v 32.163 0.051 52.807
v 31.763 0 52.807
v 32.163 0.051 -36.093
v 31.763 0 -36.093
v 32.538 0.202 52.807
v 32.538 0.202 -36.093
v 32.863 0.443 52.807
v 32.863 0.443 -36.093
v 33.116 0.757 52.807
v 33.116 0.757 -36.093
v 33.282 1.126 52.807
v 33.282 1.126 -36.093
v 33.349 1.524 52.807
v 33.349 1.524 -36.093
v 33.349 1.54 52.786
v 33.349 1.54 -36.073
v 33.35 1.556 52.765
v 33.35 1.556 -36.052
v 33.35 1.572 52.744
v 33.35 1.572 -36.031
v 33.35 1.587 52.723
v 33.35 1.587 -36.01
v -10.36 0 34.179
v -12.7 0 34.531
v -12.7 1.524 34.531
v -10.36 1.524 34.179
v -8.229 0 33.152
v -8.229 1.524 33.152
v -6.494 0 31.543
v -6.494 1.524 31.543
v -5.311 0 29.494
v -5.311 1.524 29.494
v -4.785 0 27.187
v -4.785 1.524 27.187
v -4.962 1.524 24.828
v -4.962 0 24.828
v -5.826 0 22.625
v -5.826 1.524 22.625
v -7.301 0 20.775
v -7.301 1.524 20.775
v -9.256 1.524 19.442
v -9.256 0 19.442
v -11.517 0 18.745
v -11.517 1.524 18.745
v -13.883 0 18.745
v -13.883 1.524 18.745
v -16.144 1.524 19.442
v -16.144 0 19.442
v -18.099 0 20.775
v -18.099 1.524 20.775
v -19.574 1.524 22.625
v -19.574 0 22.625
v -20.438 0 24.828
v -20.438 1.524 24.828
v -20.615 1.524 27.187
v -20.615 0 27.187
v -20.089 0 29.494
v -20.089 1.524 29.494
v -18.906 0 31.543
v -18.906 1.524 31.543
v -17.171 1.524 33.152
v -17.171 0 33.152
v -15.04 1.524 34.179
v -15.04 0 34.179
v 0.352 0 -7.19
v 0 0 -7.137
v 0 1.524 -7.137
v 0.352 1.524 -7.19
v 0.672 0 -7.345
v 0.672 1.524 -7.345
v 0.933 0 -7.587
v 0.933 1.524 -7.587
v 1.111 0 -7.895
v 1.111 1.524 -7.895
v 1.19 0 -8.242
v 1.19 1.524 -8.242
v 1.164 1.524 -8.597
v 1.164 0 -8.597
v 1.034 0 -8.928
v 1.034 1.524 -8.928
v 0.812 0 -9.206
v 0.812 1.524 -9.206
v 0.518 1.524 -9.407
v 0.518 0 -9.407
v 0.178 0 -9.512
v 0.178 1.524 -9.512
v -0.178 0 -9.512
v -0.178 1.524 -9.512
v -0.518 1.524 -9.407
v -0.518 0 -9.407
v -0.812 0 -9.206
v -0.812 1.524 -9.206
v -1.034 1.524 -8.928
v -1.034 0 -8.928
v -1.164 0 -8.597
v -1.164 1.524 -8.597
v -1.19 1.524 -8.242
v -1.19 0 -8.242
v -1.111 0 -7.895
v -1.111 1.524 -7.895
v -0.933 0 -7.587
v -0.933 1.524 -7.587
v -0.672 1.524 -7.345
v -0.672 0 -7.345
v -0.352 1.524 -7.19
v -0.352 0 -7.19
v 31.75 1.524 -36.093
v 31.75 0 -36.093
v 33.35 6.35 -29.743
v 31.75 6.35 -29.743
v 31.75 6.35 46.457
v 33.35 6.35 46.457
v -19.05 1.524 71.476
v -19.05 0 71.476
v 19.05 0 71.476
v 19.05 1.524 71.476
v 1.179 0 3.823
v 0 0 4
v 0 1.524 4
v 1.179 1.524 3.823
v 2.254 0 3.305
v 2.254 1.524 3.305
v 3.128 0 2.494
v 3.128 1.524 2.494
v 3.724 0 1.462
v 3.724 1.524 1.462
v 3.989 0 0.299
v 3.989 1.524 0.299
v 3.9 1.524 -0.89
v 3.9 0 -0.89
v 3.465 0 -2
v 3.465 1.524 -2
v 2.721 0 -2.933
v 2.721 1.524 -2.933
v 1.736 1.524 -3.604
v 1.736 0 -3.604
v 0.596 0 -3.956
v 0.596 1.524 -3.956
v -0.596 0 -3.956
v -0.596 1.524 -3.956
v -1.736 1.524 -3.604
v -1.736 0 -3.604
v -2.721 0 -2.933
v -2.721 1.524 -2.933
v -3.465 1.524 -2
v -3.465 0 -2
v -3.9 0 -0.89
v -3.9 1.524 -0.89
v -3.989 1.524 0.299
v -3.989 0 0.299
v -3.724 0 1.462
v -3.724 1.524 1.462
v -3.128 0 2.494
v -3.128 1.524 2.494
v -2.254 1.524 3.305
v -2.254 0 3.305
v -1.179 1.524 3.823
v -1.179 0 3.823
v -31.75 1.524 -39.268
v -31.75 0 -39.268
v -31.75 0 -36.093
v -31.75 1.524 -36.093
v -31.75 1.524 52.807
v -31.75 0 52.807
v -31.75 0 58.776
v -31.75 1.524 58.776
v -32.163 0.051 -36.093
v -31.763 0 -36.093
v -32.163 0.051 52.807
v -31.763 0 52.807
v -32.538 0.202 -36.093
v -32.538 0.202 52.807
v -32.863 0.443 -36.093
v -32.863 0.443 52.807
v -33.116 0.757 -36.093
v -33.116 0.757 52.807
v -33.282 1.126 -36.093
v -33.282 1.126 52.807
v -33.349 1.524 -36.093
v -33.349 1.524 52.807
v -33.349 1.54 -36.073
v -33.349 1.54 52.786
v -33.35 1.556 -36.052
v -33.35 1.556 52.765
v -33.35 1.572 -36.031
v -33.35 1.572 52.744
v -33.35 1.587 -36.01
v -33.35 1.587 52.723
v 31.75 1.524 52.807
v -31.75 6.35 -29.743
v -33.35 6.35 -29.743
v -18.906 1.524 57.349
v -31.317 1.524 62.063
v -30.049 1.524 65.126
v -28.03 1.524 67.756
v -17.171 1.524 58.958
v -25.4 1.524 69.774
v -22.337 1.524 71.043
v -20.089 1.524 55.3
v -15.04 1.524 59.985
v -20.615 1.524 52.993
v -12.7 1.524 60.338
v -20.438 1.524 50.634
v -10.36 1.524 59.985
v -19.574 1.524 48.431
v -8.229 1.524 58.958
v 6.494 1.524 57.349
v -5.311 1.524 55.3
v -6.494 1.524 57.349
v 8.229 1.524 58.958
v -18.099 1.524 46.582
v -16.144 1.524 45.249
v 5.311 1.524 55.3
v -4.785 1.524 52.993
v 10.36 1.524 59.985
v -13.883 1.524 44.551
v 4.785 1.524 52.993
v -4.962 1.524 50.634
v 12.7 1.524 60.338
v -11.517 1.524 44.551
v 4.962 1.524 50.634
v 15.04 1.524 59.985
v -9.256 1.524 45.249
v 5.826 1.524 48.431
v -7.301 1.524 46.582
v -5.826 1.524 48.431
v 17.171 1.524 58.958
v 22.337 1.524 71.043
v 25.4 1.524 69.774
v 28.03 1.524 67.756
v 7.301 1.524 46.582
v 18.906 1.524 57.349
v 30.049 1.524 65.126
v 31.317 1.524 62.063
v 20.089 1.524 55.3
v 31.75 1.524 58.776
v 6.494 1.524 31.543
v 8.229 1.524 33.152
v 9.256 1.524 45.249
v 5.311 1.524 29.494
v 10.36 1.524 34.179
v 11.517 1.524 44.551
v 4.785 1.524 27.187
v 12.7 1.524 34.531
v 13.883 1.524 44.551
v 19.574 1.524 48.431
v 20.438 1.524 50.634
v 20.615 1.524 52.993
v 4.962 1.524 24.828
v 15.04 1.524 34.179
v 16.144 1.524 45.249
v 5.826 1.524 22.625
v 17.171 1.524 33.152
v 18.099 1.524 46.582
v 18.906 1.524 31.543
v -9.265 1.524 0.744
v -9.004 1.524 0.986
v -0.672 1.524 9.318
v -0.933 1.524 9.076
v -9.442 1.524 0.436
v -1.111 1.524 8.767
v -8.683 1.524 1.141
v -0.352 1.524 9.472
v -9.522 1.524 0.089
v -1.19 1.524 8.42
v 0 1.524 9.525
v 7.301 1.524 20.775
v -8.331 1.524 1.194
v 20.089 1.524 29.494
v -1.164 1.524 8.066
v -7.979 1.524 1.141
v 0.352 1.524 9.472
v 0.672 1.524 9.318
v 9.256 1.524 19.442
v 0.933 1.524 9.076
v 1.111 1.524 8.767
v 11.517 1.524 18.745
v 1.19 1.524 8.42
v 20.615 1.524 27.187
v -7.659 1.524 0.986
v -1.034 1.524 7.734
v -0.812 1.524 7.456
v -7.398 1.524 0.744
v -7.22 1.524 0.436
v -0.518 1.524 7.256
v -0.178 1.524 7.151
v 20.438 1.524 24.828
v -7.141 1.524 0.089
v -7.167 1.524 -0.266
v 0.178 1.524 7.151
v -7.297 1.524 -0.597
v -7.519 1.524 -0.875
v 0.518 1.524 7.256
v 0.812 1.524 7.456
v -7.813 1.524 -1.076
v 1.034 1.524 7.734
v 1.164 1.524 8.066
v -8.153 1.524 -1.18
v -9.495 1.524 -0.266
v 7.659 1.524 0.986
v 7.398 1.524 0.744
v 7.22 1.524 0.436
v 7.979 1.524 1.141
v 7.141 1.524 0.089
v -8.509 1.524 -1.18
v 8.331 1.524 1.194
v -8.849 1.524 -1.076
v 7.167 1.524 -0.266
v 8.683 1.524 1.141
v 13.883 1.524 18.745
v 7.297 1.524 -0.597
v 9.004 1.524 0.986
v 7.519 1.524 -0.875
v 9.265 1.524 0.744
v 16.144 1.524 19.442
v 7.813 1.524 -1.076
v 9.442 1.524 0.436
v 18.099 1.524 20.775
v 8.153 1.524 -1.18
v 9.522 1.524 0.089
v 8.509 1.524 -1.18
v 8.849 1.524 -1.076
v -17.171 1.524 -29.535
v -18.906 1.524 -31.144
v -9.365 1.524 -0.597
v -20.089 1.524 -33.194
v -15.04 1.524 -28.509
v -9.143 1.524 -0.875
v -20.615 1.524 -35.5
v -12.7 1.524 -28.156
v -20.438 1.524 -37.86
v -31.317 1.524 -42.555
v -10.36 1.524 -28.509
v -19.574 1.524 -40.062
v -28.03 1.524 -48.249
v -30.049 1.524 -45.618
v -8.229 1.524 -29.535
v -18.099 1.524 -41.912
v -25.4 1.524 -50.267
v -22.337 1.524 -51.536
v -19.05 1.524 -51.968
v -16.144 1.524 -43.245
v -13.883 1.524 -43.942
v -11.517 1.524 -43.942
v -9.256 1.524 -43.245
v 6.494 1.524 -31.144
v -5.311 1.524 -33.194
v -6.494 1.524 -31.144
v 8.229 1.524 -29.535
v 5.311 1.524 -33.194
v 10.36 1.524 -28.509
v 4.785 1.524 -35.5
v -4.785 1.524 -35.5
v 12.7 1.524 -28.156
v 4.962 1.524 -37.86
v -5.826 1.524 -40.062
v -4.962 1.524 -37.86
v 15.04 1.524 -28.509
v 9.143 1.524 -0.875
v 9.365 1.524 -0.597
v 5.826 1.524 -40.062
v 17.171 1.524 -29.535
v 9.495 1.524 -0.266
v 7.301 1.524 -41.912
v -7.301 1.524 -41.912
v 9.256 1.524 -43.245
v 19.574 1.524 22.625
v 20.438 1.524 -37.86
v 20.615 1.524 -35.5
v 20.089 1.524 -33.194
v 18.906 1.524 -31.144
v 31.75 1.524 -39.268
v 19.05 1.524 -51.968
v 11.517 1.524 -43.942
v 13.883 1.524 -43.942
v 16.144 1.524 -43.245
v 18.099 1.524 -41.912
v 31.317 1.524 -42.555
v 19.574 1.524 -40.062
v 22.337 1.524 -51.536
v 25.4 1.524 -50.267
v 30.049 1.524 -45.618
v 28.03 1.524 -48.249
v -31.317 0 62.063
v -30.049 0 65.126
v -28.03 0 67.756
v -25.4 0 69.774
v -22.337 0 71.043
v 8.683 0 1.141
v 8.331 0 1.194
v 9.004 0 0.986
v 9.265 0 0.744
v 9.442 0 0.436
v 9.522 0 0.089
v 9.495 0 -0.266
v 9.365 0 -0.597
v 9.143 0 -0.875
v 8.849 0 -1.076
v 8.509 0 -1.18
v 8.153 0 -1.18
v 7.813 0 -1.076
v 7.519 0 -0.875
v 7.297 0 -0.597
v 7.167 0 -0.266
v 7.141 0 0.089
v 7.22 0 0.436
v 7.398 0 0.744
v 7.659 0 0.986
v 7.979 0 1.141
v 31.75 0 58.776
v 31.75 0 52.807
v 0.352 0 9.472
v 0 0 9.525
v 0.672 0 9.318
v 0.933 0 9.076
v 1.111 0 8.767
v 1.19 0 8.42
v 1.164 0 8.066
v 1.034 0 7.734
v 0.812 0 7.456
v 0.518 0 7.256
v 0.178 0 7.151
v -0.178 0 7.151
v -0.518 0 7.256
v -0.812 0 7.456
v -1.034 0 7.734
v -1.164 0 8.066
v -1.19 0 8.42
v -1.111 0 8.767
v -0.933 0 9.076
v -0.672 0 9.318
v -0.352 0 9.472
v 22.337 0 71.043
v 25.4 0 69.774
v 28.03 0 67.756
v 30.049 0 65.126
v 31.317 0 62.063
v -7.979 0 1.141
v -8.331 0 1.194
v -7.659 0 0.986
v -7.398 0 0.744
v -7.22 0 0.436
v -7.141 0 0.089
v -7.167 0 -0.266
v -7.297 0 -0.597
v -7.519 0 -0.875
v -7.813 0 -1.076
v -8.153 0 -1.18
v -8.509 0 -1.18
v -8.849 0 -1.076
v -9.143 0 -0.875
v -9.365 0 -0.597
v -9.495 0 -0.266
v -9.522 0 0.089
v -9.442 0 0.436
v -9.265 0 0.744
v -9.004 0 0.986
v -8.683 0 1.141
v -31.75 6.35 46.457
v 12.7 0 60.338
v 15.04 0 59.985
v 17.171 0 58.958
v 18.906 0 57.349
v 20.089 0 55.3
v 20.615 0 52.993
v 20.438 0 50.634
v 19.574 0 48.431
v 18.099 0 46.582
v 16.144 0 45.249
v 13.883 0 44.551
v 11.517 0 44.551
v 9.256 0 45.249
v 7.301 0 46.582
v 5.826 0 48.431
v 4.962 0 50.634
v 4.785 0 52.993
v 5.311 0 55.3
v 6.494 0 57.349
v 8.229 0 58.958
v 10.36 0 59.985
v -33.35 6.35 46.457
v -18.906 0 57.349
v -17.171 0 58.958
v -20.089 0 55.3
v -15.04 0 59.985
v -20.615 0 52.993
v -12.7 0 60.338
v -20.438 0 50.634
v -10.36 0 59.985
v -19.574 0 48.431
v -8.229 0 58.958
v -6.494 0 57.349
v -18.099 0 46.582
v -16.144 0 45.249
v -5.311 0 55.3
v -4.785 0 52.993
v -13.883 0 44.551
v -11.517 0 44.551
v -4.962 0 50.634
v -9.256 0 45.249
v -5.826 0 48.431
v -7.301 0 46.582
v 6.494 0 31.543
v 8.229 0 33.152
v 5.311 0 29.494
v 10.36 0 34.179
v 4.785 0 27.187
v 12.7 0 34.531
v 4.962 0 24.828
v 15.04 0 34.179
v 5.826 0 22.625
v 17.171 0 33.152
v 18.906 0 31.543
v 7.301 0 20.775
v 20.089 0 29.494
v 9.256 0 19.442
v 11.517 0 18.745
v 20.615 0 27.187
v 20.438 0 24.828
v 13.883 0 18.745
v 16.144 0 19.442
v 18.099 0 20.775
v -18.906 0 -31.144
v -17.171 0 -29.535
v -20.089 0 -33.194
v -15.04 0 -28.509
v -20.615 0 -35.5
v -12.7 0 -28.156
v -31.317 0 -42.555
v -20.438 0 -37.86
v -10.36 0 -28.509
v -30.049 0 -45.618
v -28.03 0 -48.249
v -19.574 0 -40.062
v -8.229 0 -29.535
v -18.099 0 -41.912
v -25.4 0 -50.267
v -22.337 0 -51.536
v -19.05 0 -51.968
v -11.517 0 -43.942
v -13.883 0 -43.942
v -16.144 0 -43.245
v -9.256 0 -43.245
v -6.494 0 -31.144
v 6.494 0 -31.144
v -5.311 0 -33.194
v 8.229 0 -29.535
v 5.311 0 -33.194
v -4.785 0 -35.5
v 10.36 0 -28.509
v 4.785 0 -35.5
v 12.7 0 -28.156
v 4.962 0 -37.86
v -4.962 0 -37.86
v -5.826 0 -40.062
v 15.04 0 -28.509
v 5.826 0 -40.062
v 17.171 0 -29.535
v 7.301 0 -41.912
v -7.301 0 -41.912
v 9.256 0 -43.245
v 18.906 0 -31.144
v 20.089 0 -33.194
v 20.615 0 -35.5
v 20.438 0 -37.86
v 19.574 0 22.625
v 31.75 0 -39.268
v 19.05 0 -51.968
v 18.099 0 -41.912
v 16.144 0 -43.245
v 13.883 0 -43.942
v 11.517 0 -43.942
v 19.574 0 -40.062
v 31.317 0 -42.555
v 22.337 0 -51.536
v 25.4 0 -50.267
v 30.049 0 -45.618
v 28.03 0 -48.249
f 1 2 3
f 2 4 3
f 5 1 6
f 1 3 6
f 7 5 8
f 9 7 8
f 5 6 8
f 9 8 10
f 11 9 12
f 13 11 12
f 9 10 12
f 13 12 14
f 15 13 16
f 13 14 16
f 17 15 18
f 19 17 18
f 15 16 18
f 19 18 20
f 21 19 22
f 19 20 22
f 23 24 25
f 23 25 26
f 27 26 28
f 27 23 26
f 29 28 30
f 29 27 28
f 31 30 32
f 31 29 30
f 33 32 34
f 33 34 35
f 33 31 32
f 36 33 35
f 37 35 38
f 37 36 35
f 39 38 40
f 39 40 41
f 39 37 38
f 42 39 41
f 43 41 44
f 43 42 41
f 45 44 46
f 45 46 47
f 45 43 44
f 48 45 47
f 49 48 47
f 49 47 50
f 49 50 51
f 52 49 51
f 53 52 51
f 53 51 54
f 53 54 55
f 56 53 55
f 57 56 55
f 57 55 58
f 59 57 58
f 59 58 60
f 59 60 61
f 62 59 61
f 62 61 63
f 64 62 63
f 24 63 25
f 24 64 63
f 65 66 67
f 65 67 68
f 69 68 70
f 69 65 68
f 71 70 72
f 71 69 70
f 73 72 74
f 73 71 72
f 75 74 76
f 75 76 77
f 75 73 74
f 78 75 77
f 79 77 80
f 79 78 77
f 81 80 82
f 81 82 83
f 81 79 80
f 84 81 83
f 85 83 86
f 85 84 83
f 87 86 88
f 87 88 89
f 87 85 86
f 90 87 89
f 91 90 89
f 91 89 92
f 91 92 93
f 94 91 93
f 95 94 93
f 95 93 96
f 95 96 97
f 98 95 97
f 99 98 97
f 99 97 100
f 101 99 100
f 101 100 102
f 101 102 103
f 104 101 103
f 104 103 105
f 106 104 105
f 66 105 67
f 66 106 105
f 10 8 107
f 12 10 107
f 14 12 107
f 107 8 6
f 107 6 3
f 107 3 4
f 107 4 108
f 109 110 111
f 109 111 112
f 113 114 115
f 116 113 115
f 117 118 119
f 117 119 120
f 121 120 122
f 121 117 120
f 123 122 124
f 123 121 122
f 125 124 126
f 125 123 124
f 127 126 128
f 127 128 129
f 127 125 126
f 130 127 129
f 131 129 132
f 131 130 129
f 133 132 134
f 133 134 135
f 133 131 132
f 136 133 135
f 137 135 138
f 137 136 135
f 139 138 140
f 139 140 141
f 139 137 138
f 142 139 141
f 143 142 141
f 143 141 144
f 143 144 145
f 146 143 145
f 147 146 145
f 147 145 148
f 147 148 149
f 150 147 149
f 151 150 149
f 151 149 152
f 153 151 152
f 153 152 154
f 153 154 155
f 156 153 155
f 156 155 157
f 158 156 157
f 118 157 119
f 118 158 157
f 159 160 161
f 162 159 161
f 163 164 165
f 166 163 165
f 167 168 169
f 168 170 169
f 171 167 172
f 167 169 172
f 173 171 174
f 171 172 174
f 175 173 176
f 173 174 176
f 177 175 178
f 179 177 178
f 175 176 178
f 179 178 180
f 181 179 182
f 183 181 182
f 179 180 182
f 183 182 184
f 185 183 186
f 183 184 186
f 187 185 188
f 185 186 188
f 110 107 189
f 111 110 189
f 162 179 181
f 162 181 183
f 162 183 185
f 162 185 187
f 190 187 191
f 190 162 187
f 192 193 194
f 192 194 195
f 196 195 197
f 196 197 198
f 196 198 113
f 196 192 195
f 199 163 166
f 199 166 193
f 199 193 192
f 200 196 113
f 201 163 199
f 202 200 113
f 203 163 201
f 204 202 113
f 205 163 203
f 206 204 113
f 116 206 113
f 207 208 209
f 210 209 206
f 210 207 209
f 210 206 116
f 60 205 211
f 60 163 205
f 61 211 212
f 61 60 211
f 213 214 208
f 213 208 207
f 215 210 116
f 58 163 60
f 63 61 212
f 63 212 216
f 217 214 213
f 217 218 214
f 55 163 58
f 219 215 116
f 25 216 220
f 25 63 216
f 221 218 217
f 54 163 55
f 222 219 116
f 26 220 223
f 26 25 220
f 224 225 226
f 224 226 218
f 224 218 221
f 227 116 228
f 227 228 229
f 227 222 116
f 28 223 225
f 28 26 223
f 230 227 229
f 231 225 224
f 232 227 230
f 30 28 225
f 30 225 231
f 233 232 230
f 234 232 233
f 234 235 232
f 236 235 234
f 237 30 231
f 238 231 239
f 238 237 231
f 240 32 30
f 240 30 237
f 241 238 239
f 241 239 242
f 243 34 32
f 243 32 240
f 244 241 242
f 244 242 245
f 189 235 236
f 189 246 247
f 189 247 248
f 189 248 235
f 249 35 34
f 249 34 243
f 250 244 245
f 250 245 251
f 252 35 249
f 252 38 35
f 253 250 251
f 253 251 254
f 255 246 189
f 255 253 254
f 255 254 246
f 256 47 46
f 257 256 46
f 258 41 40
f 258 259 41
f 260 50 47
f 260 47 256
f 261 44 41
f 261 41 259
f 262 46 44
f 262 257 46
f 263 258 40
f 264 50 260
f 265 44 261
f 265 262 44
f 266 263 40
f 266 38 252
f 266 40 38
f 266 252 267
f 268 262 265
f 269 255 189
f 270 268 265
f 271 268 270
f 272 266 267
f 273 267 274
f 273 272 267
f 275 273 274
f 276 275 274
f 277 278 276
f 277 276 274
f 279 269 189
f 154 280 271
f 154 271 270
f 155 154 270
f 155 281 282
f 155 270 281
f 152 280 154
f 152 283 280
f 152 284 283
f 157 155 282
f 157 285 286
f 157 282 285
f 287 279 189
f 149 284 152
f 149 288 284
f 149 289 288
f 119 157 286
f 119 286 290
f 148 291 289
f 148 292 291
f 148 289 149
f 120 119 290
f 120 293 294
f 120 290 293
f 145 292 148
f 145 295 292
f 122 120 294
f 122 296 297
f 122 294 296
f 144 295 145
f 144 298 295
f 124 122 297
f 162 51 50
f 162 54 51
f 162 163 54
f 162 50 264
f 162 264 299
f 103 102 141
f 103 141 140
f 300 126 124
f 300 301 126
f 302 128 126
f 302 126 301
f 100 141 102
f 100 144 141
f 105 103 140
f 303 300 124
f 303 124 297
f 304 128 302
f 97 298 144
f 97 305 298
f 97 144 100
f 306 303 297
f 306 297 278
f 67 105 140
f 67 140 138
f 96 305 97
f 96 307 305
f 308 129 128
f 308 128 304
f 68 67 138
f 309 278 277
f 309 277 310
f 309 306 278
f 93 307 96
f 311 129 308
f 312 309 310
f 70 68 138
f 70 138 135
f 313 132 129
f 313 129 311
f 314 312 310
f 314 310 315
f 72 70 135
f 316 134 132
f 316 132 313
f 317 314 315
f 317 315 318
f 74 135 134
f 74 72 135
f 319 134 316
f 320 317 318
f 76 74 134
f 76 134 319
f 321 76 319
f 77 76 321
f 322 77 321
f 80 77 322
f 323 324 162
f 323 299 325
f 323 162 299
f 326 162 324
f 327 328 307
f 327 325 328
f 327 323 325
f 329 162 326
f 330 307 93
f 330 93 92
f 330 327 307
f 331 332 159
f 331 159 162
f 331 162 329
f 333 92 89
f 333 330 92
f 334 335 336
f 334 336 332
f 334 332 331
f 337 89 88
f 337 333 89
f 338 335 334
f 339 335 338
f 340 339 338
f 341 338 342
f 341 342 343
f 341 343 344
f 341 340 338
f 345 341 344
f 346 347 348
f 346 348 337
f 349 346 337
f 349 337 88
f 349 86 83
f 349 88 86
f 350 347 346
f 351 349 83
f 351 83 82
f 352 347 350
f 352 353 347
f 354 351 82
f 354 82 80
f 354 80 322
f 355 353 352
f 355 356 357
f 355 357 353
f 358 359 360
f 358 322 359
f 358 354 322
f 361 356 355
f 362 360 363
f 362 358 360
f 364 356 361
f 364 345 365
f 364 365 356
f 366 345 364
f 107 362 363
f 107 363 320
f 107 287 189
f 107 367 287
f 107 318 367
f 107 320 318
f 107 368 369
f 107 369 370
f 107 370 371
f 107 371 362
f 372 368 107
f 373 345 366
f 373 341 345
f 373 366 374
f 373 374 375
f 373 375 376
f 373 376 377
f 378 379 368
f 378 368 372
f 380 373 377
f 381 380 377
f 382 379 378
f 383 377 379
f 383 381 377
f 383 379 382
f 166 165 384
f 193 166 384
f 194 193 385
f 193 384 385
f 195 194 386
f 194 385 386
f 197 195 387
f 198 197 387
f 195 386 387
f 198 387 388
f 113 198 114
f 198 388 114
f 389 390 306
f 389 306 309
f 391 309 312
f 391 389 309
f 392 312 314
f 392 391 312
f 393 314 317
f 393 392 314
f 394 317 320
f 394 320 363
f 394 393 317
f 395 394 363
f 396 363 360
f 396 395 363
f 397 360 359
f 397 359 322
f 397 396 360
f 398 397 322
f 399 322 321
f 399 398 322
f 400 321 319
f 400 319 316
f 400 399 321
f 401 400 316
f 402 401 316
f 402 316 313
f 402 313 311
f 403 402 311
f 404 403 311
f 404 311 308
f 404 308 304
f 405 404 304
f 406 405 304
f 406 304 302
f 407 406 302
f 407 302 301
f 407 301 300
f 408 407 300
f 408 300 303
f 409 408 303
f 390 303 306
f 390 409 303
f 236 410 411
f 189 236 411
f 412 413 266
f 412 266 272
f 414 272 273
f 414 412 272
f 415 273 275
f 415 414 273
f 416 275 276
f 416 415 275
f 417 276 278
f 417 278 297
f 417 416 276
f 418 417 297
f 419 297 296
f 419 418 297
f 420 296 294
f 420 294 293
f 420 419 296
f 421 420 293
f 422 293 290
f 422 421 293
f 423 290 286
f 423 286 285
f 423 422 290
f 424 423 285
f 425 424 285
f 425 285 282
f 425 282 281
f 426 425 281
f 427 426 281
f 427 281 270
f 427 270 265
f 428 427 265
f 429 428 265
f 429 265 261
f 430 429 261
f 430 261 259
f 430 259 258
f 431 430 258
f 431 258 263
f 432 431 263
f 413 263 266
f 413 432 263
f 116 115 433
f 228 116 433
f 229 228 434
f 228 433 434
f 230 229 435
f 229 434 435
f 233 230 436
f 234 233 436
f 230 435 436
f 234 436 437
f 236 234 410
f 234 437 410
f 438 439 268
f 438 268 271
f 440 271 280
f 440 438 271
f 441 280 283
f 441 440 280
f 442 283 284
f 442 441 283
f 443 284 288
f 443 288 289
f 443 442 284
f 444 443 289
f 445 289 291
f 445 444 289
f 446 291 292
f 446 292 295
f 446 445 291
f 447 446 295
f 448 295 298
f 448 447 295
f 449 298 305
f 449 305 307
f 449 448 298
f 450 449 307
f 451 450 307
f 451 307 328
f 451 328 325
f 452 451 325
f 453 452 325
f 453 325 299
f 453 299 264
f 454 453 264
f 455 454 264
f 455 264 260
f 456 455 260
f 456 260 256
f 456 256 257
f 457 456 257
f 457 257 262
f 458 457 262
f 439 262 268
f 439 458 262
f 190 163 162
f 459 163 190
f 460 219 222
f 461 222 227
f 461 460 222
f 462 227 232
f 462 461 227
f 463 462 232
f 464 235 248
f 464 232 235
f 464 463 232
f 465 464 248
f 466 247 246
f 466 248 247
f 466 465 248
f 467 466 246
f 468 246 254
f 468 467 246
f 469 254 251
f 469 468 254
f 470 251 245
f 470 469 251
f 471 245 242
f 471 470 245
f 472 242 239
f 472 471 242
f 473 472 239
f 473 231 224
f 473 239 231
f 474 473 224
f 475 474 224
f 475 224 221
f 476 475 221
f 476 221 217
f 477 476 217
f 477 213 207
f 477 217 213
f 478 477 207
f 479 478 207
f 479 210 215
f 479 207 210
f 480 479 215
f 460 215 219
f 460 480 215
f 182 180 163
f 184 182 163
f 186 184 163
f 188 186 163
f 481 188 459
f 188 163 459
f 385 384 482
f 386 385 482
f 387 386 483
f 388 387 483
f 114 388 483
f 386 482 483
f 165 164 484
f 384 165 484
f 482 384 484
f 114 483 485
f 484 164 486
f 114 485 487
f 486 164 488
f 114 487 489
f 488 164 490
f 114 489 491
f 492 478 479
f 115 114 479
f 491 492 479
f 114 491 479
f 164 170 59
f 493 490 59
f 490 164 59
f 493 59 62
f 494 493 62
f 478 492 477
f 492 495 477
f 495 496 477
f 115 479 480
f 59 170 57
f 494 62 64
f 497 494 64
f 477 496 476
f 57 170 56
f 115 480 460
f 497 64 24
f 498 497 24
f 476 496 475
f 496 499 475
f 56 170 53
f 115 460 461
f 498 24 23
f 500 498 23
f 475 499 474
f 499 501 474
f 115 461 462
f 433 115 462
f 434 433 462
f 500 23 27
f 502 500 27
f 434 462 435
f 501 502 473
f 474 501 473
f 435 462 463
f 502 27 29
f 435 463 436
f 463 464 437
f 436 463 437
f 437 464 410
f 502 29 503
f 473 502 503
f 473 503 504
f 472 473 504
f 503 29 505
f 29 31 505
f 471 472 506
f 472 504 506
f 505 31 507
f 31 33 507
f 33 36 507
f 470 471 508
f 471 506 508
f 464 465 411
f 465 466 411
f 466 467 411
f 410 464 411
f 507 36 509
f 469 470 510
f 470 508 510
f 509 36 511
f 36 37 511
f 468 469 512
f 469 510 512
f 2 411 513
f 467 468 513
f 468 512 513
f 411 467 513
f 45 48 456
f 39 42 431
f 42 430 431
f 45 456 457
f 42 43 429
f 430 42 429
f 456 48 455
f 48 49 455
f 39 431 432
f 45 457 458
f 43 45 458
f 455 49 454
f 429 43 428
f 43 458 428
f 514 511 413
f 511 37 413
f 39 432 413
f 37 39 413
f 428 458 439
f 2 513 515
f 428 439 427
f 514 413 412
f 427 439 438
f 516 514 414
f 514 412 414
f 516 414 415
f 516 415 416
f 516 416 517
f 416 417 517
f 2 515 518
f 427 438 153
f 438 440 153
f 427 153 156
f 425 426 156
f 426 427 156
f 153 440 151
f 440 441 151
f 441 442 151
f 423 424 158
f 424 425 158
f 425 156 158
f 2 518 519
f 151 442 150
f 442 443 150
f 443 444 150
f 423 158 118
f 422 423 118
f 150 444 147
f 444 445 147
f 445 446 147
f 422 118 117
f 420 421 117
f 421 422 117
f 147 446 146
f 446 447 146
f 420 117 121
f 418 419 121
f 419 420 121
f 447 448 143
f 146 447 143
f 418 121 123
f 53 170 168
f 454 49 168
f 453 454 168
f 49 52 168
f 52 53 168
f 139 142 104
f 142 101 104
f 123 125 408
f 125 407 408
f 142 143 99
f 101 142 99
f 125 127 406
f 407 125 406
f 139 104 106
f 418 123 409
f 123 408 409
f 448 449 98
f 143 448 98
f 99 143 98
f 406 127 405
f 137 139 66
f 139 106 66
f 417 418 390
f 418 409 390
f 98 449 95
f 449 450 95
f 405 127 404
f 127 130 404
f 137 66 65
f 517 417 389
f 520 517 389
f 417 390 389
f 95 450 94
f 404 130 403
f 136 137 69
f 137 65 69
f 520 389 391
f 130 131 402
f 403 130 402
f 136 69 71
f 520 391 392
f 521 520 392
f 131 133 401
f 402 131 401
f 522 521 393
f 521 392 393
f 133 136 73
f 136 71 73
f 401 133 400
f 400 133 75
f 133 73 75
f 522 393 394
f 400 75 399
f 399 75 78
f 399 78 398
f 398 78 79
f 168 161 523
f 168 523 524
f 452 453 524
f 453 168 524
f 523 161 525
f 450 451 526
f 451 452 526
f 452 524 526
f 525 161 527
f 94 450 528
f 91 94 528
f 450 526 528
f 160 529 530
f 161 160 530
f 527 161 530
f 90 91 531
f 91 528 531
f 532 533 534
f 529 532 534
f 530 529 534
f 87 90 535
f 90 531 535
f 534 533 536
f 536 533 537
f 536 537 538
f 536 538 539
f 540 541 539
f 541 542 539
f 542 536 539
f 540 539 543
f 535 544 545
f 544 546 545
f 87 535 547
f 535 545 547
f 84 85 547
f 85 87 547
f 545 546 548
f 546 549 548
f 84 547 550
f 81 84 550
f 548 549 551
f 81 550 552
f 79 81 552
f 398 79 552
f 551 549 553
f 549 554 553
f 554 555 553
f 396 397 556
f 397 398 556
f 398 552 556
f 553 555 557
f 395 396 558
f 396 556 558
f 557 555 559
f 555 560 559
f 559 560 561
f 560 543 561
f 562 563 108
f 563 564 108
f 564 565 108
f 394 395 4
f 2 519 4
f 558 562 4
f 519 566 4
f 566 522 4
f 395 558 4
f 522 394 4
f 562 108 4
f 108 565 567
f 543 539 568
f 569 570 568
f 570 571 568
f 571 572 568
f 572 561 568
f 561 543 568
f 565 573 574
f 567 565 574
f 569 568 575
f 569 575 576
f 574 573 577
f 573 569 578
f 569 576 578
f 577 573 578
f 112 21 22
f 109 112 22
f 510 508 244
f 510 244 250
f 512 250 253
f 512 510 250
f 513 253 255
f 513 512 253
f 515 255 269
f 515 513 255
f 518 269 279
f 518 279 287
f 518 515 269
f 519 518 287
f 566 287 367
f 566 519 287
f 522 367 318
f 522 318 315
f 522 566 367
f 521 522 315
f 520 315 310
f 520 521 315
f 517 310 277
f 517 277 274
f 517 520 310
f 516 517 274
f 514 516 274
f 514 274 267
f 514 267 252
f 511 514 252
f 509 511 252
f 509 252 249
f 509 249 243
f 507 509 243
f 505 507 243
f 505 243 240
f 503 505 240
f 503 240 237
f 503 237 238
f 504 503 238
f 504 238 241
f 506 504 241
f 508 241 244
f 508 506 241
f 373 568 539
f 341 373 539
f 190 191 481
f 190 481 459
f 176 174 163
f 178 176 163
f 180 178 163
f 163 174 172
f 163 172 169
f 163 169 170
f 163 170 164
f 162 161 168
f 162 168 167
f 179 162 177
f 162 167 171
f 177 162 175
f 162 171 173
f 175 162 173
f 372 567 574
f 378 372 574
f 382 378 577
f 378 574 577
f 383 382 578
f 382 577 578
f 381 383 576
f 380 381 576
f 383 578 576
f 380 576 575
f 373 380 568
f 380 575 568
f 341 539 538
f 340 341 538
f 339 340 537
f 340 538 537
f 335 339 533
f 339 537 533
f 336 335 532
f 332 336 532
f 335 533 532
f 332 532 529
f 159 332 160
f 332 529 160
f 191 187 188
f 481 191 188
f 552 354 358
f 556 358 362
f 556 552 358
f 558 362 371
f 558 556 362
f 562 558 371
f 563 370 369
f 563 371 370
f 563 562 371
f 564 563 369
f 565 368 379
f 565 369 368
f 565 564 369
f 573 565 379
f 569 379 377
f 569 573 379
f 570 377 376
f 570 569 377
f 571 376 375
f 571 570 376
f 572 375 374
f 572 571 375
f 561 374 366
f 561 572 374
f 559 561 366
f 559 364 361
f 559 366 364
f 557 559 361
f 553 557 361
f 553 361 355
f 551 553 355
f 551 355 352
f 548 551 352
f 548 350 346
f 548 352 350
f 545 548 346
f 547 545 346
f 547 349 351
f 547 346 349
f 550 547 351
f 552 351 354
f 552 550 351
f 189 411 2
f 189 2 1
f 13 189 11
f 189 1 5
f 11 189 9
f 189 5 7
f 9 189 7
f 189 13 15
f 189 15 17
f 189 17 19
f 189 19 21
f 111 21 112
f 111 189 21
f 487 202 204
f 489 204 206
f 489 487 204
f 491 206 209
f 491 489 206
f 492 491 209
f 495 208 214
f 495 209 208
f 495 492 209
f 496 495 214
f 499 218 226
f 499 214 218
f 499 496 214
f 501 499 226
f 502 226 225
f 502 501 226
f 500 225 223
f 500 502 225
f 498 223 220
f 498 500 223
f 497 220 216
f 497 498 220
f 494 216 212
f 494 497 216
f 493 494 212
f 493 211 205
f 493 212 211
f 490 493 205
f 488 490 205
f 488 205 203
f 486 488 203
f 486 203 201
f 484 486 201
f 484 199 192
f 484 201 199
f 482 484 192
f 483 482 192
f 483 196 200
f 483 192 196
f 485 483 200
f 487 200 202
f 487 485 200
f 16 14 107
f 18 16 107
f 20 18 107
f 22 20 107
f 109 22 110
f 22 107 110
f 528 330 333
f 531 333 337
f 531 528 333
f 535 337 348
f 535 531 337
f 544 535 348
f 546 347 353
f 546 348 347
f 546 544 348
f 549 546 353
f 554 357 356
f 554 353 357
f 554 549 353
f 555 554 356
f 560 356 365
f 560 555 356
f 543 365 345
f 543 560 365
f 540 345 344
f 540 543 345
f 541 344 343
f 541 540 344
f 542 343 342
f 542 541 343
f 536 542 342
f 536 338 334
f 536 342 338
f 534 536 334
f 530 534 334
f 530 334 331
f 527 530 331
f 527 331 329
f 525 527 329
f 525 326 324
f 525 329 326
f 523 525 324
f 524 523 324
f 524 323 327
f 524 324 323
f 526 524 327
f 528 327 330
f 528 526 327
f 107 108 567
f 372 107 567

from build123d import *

# Parameters (mm, degrees)
SKETCH1_R               = 7.9375
SKETCH1_R_2             = 4.0005
SKETCH1_R_3             = 1.1938
EXTRUDE1_DEPTH          = 1.524
EXTRUDE2_DEPTH          = 6.35
CUT_EXTRUDE1_DEPTH      = 34.3502
CUT_EXTRUDE1_DEPTH_BACK = 34.3502
FILLET1_R               = 1.5875


with BuildPart() as part:
    # Sketch1 → Extrude1 (new body)
    with BuildSketch(Plane(origin=(0, 0, 0), x_dir=(1, 0, 0), z_dir=(0, 1, 0))):
        with BuildLine():
            Line((-31.75, -3.2004), (-31.75, -58.7756))
            ThreePointArc((-31.75, -58.7756), (-28.030256121, -67.755856121), (-19.05, -71.4756))
            Line((-19.05, -71.4756), (19.05, -71.4756))
            ThreePointArc((19.05, -71.4756), (28.030256121, -67.755856121), (31.75, -58.7756))
            Line((31.75, -58.7756), (31.75, -3.2004))
            Line((31.75, -3.2004), (31.75, 39.2684))
            ThreePointArc((31.75, 39.2684), (28.030256121, 48.248656121), (19.05, 51.9684))
            Line((19.05, 51.9684), (12.7, 51.9684))
            Line((12.7, 51.9684), (-12.7, 51.9684))
            Line((-12.7, 51.9684), (-19.05, 51.9684))
            ThreePointArc((-19.05, 51.9684), (-28.030256121, 48.248656121), (-31.75, 39.2684))
            Line((-31.75, 39.2684), (-31.75, -3.2004))
        make_face()
        with Locations(Location((-12.7, -52.4002, 0), (0, 0, 270))):  # turned: the seam where the file's is
            Circle(SKETCH1_R, mode=Mode.SUBTRACT)
        with Locations(Location((-12.7, 36.0934, 0), (0, 0, 270))):  # turned: the seam where the file's is
            Circle(SKETCH1_R, mode=Mode.SUBTRACT)
        with Locations(Location((12.7, -52.4002, 0), (0, 0, 270))):  # turned: the seam where the file's is
            Circle(SKETCH1_R, mode=Mode.SUBTRACT)
        with Locations(Location((12.7, -26.5938, 0), (0, 0, 270))):  # turned: the seam where the file's is
            Circle(SKETCH1_R, mode=Mode.SUBTRACT)
        with Locations(Location((12.7, 36.0934, 0), (0, 0, 270))):  # turned: the seam where the file's is
            Circle(SKETCH1_R, mode=Mode.SUBTRACT)
        with Locations(Location((0, 0, 0), (0, 0, 270))):  # turned: the seam where the file's is
            Circle(SKETCH1_R_2, mode=Mode.SUBTRACT)
        with Locations(Location((8.3312, 0, 0), (0, 0, 270))):  # turned: the seam where the file's is
            Circle(SKETCH1_R_3, mode=Mode.SUBTRACT)
        with Locations(Location((0, -8.3312, 0), (0, 0, 270))):  # turned: the seam where the file's is
            Circle(SKETCH1_R_3, mode=Mode.SUBTRACT)
        with Locations(Location((0, 8.3312, 0), (0, 0, 270))):  # turned: the seam where the file's is
            Circle(SKETCH1_R_3, mode=Mode.SUBTRACT)
        with Locations(Location((-8.3312, 0, 0), (0, 0, 270))):  # turned: the seam where the file's is
            Circle(SKETCH1_R_3, mode=Mode.SUBTRACT)
        with Locations(Location((-12.7, -26.5938, 0), (0, 0, 270))):  # turned: the seam where the file's is
            Circle(SKETCH1_R, mode=Mode.SUBTRACT)
    extrude(amount=EXTRUDE1_DEPTH)

    # Sketch1_3 → Extrude2 (add)
    with BuildSketch(Plane(origin=(0, 0, 0), x_dir=(1, 0, 0), z_dir=(0, 1, 0))):
        Polygon((31.75, 36.0934), (31.75, -3.2004), (31.75, -52.8066), (33.3502, -52.8066), (33.3502, 36.0934), align=None)
        Polygon((-33.3502, -52.8066), (-31.75, -52.8066), (-31.75, -3.2004), (-31.75, 36.0934), (-33.3502, 36.0934), align=None)
    extrude(amount=EXTRUDE2_DEPTH)

    # Sketch2 → Cut-Extrude1 (cut, two sides)
    with BuildSketch(Plane(origin=(0, 0, 0), x_dir=(0, 0, -1), z_dir=(1, 0, 0))) as cut_extrude1_sk:
        Polygon((-52.8066, 1.524), (-46.4566, 6.35), (-52.8066, 6.35), align=None)
        Polygon((36.0934, 6.35), (36.0934, 1.524), (29.7434, 6.35), align=None)
    extrude(amount=CUT_EXTRUDE1_DEPTH, mode=Mode.SUBTRACT)
    extrude(cut_extrude1_sk.sketch, amount=-CUT_EXTRUDE1_DEPTH_BACK, mode=Mode.SUBTRACT)

    # Fillet1
    fillet1_edges = [part.edges().sort_by_distance(p)[0] for p in [
        (33.3502, 0, 8.3566),
        (-33.3502, 0, 8.3566),
    ]]
    fillet(fillet1_edges, radius=FILLET1_R)


solid = part.part
